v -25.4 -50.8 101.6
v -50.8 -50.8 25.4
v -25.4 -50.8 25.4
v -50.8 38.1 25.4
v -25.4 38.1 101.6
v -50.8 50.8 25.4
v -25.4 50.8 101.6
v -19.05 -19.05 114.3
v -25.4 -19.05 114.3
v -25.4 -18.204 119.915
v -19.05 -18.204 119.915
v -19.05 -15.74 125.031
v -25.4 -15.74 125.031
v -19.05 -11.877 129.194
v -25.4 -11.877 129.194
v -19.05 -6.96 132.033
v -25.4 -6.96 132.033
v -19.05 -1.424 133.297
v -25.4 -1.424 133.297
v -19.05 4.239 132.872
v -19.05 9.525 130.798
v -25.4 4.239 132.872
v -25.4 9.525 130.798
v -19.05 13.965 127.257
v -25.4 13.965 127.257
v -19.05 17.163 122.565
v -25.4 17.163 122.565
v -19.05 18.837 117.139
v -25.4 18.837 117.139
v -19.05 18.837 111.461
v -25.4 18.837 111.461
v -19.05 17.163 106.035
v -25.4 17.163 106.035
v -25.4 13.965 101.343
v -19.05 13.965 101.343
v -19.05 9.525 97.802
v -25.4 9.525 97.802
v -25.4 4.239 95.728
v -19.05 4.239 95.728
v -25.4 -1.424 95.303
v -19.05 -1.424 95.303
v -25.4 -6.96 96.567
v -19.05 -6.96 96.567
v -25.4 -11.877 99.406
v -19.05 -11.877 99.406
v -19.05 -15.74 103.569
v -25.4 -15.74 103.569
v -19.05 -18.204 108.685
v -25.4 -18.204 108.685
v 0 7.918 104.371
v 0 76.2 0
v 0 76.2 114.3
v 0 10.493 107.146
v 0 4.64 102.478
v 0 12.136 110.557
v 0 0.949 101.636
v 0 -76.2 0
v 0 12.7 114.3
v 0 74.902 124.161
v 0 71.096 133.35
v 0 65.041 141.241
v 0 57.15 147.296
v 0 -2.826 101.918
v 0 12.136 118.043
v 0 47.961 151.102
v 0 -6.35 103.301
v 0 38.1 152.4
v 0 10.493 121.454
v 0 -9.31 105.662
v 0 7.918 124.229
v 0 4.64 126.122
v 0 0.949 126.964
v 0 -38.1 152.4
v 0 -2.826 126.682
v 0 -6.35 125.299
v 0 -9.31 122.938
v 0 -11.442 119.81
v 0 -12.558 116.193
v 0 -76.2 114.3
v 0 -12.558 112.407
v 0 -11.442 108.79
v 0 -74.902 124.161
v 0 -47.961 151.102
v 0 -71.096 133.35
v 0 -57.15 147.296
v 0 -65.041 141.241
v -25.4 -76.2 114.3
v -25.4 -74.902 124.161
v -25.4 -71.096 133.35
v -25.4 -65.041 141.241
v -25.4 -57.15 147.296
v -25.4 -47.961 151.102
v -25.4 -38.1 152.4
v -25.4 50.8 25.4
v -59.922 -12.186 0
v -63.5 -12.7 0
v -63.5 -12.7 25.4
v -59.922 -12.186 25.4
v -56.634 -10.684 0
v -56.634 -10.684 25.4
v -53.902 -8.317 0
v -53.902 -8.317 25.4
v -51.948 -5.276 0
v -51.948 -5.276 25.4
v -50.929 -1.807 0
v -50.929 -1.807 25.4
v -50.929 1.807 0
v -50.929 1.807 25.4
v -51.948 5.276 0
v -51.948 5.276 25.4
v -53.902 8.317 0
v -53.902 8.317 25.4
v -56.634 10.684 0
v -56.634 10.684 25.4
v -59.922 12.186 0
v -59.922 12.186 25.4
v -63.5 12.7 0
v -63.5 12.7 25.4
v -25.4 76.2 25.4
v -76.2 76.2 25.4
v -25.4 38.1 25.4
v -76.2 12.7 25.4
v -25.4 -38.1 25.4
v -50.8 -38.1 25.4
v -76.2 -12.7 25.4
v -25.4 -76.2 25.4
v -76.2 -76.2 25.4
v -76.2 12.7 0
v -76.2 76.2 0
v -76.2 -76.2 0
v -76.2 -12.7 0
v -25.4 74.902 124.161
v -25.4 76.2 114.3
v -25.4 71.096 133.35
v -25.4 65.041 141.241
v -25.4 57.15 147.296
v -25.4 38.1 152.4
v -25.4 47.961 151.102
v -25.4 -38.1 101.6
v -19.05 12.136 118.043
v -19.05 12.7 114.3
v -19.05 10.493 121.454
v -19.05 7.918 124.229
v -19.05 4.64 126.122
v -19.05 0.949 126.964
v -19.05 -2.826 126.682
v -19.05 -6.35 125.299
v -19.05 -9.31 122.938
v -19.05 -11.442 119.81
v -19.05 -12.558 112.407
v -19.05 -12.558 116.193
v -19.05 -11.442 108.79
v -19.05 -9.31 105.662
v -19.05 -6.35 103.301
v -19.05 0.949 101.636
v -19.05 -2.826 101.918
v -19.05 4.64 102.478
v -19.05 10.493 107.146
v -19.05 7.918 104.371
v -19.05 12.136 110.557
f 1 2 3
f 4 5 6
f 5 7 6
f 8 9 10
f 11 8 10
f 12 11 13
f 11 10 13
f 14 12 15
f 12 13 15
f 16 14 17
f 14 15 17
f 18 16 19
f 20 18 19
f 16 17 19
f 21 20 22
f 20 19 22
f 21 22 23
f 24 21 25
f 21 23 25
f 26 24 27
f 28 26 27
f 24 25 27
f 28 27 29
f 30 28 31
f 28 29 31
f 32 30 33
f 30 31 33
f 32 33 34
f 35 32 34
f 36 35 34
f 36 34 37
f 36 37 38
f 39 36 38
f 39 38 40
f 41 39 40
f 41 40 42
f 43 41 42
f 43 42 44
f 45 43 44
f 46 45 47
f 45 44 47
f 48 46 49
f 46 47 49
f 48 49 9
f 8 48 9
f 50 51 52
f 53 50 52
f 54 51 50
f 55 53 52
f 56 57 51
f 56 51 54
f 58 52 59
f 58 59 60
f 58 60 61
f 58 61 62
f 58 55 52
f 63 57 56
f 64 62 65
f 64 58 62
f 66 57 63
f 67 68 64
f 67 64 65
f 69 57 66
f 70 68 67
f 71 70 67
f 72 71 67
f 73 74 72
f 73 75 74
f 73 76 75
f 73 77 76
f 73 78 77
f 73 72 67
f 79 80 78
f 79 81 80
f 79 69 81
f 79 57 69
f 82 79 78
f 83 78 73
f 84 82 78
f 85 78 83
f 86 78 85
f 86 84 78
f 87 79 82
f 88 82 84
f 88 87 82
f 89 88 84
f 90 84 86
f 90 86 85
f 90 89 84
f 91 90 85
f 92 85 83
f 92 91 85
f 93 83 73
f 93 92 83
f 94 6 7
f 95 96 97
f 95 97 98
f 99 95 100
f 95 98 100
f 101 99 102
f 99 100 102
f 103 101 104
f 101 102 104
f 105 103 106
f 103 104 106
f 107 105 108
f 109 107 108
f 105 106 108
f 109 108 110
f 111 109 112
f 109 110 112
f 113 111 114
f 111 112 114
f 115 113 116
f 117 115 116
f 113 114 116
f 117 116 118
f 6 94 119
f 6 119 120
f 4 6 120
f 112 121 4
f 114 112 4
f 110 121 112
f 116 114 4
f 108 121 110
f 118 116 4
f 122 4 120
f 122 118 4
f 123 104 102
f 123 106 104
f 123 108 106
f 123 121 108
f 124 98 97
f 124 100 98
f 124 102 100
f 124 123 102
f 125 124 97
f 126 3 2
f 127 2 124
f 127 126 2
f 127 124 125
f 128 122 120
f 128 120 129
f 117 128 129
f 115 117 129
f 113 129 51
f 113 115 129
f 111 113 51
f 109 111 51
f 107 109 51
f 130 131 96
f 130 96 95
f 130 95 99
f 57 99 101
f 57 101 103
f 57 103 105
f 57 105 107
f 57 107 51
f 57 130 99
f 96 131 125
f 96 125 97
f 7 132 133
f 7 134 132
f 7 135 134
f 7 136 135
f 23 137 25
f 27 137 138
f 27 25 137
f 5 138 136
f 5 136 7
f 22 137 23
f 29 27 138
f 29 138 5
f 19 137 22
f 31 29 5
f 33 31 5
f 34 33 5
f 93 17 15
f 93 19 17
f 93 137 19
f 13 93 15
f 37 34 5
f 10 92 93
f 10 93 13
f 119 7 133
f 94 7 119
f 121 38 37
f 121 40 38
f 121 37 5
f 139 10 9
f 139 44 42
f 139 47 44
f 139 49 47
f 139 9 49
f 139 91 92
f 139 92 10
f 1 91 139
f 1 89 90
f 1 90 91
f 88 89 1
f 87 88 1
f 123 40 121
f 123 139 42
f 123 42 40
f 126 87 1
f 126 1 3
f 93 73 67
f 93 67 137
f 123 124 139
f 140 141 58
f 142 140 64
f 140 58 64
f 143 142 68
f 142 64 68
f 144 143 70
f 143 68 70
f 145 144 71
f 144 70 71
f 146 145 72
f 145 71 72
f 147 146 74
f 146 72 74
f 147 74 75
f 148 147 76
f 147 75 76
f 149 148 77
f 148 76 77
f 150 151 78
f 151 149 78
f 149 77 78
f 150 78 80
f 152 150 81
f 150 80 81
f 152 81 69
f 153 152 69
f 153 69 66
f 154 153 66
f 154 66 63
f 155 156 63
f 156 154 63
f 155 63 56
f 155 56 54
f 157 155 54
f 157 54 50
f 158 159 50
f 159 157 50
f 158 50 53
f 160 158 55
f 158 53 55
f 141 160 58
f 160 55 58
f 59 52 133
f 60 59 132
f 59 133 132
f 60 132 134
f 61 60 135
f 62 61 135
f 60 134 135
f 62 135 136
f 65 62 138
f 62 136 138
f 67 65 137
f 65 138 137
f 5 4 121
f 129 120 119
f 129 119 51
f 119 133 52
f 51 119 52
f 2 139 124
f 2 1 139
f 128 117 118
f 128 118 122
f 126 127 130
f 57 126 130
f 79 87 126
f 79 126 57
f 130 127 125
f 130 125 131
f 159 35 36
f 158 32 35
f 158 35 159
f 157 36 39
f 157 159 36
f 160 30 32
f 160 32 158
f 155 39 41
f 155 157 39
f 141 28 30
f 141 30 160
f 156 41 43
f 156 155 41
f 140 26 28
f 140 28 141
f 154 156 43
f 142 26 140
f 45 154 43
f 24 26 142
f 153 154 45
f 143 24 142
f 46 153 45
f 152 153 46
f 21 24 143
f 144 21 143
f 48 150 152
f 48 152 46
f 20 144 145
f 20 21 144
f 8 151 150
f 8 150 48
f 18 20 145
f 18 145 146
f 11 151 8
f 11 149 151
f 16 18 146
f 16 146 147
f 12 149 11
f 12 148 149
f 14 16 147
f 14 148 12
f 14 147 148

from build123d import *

# Parameters (mm, degrees)
F1_DEPTH  = 76.2
F2_R      = 12.7
F3_DEPTH  = 76.201
F5_DEPTH  = 25.401
F6_R      = 38.1
F7_R      = 19.05
F7_R_2    = 12.7
F8_DEPTH  = 6.35
F11_DEPTH = 6.35


# Not quite as in the source:
# - a pattern or mirror of a feature is missing from the dataset's text; its kind, count and spacing are read off the source's solid


with BuildPart() as f1:
    # F0 (on Front) → F1 (new body, symmetric)
    with BuildSketch(Plane.XZ):
        Polygon((-76.2, 0), (0, 0), (0, 152.4), (-25.4, 152.4), (-25.4, 25.4), (-76.2, 25.4), align=None)
    extrude(amount=F1_DEPTH, both=True)

    # F2 (on face) → F3 (cut, through all)
    with BuildSketch(Plane.YZ):
        with Locations((0, 114.3)):
            Circle(F2_R)
    extrude(amount=-F3_DEPTH, mode=Mode.SUBTRACT)

    # F4 (on face) → F5 (cut, through all)
    with BuildSketch(Plane.XY.offset(25.4)):
        with BuildLine():
            Line((-63.5, 12.7), (-76.2, 12.7))
            Line((-76.2, 12.7), (-76.2, -12.7))
            Line((-76.2, -12.7), (-63.5, -12.7))
            ThreePointArc((-63.5, -12.7), (-50.8, 0), (-63.5, 12.7))
        make_face()
    extrude(amount=-F5_DEPTH, mode=Mode.SUBTRACT)

    # F6
    f6_edges = [f1.edges().sort_by_distance(p)[0] for p in [
        (-12.7, -76.2, 152.4),
        (-12.7, 76.2, 152.4),
    ]]
    fillet(f6_edges, radius=F6_R)

    # F7 (on face) → F8 (cut)
    with BuildSketch(Plane(origin=(-25.4, 0, 0), x_dir=(0, -1, 0), z_dir=(-1, 0, 0))):
        with Locations((0, 114.3)):
            Circle(F7_R)
        with Locations((0, 114.3)):
            Circle(F7_R_2, mode=Mode.SUBTRACT)
    extrude(amount=-F8_DEPTH, mode=Mode.SUBTRACT)

    # F10 (on offset) → F11 (join, symmetric)
    with BuildSketch(Plane.XZ.offset(44.45)):
        Polygon((-50.8, 25.4), (-25.4, 25.4), (-25.4, 101.6), align=None)
    f11 = extrude(amount=F11_DEPTH, both=True)

    # F11_copies: F11 across plane
    add(f11.mirror(Plane.ZX))


solid = f1.part
